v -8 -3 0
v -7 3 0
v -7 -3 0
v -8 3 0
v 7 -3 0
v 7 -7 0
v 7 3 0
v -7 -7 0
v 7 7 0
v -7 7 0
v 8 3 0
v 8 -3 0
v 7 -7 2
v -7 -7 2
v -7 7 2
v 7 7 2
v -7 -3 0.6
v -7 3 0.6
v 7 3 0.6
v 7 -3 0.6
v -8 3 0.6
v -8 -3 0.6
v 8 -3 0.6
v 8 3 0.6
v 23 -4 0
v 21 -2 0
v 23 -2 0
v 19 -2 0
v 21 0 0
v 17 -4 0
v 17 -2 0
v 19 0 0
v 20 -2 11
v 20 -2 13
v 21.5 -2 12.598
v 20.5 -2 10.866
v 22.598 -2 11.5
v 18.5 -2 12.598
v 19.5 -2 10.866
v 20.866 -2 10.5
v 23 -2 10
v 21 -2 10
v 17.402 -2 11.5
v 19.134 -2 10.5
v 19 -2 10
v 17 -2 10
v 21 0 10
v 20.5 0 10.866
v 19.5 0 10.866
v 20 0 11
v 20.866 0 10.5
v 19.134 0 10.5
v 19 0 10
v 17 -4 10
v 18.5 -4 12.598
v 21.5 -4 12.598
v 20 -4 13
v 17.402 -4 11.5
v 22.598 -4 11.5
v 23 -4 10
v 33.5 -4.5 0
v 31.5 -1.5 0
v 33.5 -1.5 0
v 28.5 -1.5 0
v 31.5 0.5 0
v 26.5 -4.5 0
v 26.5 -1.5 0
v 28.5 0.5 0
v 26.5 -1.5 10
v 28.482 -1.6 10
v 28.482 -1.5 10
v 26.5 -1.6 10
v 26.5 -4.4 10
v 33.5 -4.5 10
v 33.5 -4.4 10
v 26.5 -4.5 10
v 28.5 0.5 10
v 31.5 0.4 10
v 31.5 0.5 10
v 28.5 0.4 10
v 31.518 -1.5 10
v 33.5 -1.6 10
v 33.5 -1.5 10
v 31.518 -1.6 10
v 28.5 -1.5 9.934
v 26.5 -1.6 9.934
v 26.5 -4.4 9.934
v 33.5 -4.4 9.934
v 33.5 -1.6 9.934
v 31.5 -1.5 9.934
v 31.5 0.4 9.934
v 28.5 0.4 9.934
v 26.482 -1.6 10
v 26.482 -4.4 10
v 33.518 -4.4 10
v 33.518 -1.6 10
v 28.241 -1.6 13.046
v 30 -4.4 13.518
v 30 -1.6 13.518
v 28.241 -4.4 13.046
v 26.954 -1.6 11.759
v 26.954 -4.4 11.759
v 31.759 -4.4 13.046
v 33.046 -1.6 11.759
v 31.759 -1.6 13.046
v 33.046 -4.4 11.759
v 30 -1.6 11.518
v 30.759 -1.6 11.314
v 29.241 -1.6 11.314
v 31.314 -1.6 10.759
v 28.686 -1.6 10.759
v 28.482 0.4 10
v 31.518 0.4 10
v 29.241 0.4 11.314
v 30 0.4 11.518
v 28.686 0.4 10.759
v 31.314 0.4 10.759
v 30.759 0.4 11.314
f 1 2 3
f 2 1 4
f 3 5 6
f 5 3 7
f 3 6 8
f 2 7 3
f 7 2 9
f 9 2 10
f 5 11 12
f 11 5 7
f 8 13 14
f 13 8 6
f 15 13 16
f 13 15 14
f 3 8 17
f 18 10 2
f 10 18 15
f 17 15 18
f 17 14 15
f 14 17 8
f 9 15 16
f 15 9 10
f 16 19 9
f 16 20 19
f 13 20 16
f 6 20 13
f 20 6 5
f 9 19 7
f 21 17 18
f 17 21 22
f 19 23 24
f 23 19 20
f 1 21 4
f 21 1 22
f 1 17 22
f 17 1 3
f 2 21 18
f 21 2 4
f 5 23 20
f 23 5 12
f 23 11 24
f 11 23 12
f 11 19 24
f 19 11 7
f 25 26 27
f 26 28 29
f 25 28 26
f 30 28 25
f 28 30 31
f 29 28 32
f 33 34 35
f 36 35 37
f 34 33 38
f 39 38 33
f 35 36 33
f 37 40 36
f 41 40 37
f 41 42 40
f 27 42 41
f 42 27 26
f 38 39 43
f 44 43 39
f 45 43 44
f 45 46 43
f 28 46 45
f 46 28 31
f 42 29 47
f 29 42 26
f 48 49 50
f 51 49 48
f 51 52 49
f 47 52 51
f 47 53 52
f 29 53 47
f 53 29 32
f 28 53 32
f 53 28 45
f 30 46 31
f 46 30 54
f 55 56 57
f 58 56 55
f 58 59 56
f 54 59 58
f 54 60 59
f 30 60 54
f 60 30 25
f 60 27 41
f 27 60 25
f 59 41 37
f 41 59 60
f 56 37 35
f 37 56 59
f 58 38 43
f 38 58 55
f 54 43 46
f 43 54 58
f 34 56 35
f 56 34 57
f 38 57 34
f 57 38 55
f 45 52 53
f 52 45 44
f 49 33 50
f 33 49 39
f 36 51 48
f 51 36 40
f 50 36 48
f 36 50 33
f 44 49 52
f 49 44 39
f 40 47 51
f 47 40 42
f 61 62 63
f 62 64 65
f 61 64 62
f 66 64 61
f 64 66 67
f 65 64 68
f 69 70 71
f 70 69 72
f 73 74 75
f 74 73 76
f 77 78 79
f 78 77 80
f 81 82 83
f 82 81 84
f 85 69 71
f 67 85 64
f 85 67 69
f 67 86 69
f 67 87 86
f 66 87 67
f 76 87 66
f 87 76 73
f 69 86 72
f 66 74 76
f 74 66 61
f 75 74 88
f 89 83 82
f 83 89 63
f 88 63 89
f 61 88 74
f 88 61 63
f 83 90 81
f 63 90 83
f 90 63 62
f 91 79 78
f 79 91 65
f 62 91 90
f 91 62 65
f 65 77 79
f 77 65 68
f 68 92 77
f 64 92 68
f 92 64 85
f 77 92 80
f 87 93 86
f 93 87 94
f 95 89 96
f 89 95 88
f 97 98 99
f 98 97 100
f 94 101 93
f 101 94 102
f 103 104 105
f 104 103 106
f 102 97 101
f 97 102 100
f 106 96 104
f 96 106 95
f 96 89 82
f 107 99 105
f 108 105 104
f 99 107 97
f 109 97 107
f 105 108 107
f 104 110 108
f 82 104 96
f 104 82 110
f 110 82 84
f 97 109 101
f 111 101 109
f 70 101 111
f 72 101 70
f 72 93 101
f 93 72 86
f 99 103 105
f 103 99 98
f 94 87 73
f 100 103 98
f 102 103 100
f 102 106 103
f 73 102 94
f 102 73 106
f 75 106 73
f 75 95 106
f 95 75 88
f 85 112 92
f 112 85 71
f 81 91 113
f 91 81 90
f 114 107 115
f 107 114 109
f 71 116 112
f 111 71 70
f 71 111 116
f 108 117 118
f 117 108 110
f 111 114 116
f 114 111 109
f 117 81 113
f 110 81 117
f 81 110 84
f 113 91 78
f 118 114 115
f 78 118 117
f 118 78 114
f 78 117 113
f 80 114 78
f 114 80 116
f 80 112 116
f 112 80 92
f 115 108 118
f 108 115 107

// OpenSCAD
module keyswitch_hole(x=0, y=0, a=0) {
    translate([x, y, 0]) {
        rotate([0, 0, 90+a]) {
            linear_extrude(height = 2) {
            square([14, 14], center = true);
            //translate([-8, 3, 0]) square([1, 3]);
            //translate([-8, -6, 0]) square([1, 3]);
            //translate([7, 3, 0]) square([1, 3]);
            //translate([7, -6, 0]) square([1, 3]);
            }
            linear_extrude(height = 0.6) {
                translate([-3, 7]) square([6, 1]);
            translate([-3, -8]) square([6, 1]);
            }
        }
    }
}

keyswitch_hole();

module joint_male_face() {
    translate([-1, 0])
    square([2,4]);
    translate([-3, 2])
    square([6,2]);
}

module joint_male(pos=[0,0]) {
    translate(pos){
      rotate([0,0,180]){
        linear_extrude(height=10)
        joint_male_face();
        
        translate([0,2,10])
        rotate([-90,0,0])
        linear_extrude(height=2)
        circle(3, $fn=12);
        
        translate([0,0,10])
        rotate([-90,0,0])
        linear_extrude(height=2)
        circle(1, $fn=12);
      }
    }
}

module joint_female(pos=[0,0]) {
    delta = 0.5;
    translate(pos){
      rotate([0,0,180]){
        linear_extrude(height=10)
        offset(delta=delta)
        joint_male_face();
        
        translate([0,1.6,10])
        rotate([-90,0,0])
        linear_extrude(height=2.8)
        offset(delta=delta)
        circle(3, $fn=12);

        translate([0,-0.4,10])
        rotate([-90,0,0])
        linear_extrude(height=2.8)
        offset(delta=delta)
        circle(1, $fn=12);
      }
    }
}


joint_male([20, 0]);
joint_female([30, 0]);
